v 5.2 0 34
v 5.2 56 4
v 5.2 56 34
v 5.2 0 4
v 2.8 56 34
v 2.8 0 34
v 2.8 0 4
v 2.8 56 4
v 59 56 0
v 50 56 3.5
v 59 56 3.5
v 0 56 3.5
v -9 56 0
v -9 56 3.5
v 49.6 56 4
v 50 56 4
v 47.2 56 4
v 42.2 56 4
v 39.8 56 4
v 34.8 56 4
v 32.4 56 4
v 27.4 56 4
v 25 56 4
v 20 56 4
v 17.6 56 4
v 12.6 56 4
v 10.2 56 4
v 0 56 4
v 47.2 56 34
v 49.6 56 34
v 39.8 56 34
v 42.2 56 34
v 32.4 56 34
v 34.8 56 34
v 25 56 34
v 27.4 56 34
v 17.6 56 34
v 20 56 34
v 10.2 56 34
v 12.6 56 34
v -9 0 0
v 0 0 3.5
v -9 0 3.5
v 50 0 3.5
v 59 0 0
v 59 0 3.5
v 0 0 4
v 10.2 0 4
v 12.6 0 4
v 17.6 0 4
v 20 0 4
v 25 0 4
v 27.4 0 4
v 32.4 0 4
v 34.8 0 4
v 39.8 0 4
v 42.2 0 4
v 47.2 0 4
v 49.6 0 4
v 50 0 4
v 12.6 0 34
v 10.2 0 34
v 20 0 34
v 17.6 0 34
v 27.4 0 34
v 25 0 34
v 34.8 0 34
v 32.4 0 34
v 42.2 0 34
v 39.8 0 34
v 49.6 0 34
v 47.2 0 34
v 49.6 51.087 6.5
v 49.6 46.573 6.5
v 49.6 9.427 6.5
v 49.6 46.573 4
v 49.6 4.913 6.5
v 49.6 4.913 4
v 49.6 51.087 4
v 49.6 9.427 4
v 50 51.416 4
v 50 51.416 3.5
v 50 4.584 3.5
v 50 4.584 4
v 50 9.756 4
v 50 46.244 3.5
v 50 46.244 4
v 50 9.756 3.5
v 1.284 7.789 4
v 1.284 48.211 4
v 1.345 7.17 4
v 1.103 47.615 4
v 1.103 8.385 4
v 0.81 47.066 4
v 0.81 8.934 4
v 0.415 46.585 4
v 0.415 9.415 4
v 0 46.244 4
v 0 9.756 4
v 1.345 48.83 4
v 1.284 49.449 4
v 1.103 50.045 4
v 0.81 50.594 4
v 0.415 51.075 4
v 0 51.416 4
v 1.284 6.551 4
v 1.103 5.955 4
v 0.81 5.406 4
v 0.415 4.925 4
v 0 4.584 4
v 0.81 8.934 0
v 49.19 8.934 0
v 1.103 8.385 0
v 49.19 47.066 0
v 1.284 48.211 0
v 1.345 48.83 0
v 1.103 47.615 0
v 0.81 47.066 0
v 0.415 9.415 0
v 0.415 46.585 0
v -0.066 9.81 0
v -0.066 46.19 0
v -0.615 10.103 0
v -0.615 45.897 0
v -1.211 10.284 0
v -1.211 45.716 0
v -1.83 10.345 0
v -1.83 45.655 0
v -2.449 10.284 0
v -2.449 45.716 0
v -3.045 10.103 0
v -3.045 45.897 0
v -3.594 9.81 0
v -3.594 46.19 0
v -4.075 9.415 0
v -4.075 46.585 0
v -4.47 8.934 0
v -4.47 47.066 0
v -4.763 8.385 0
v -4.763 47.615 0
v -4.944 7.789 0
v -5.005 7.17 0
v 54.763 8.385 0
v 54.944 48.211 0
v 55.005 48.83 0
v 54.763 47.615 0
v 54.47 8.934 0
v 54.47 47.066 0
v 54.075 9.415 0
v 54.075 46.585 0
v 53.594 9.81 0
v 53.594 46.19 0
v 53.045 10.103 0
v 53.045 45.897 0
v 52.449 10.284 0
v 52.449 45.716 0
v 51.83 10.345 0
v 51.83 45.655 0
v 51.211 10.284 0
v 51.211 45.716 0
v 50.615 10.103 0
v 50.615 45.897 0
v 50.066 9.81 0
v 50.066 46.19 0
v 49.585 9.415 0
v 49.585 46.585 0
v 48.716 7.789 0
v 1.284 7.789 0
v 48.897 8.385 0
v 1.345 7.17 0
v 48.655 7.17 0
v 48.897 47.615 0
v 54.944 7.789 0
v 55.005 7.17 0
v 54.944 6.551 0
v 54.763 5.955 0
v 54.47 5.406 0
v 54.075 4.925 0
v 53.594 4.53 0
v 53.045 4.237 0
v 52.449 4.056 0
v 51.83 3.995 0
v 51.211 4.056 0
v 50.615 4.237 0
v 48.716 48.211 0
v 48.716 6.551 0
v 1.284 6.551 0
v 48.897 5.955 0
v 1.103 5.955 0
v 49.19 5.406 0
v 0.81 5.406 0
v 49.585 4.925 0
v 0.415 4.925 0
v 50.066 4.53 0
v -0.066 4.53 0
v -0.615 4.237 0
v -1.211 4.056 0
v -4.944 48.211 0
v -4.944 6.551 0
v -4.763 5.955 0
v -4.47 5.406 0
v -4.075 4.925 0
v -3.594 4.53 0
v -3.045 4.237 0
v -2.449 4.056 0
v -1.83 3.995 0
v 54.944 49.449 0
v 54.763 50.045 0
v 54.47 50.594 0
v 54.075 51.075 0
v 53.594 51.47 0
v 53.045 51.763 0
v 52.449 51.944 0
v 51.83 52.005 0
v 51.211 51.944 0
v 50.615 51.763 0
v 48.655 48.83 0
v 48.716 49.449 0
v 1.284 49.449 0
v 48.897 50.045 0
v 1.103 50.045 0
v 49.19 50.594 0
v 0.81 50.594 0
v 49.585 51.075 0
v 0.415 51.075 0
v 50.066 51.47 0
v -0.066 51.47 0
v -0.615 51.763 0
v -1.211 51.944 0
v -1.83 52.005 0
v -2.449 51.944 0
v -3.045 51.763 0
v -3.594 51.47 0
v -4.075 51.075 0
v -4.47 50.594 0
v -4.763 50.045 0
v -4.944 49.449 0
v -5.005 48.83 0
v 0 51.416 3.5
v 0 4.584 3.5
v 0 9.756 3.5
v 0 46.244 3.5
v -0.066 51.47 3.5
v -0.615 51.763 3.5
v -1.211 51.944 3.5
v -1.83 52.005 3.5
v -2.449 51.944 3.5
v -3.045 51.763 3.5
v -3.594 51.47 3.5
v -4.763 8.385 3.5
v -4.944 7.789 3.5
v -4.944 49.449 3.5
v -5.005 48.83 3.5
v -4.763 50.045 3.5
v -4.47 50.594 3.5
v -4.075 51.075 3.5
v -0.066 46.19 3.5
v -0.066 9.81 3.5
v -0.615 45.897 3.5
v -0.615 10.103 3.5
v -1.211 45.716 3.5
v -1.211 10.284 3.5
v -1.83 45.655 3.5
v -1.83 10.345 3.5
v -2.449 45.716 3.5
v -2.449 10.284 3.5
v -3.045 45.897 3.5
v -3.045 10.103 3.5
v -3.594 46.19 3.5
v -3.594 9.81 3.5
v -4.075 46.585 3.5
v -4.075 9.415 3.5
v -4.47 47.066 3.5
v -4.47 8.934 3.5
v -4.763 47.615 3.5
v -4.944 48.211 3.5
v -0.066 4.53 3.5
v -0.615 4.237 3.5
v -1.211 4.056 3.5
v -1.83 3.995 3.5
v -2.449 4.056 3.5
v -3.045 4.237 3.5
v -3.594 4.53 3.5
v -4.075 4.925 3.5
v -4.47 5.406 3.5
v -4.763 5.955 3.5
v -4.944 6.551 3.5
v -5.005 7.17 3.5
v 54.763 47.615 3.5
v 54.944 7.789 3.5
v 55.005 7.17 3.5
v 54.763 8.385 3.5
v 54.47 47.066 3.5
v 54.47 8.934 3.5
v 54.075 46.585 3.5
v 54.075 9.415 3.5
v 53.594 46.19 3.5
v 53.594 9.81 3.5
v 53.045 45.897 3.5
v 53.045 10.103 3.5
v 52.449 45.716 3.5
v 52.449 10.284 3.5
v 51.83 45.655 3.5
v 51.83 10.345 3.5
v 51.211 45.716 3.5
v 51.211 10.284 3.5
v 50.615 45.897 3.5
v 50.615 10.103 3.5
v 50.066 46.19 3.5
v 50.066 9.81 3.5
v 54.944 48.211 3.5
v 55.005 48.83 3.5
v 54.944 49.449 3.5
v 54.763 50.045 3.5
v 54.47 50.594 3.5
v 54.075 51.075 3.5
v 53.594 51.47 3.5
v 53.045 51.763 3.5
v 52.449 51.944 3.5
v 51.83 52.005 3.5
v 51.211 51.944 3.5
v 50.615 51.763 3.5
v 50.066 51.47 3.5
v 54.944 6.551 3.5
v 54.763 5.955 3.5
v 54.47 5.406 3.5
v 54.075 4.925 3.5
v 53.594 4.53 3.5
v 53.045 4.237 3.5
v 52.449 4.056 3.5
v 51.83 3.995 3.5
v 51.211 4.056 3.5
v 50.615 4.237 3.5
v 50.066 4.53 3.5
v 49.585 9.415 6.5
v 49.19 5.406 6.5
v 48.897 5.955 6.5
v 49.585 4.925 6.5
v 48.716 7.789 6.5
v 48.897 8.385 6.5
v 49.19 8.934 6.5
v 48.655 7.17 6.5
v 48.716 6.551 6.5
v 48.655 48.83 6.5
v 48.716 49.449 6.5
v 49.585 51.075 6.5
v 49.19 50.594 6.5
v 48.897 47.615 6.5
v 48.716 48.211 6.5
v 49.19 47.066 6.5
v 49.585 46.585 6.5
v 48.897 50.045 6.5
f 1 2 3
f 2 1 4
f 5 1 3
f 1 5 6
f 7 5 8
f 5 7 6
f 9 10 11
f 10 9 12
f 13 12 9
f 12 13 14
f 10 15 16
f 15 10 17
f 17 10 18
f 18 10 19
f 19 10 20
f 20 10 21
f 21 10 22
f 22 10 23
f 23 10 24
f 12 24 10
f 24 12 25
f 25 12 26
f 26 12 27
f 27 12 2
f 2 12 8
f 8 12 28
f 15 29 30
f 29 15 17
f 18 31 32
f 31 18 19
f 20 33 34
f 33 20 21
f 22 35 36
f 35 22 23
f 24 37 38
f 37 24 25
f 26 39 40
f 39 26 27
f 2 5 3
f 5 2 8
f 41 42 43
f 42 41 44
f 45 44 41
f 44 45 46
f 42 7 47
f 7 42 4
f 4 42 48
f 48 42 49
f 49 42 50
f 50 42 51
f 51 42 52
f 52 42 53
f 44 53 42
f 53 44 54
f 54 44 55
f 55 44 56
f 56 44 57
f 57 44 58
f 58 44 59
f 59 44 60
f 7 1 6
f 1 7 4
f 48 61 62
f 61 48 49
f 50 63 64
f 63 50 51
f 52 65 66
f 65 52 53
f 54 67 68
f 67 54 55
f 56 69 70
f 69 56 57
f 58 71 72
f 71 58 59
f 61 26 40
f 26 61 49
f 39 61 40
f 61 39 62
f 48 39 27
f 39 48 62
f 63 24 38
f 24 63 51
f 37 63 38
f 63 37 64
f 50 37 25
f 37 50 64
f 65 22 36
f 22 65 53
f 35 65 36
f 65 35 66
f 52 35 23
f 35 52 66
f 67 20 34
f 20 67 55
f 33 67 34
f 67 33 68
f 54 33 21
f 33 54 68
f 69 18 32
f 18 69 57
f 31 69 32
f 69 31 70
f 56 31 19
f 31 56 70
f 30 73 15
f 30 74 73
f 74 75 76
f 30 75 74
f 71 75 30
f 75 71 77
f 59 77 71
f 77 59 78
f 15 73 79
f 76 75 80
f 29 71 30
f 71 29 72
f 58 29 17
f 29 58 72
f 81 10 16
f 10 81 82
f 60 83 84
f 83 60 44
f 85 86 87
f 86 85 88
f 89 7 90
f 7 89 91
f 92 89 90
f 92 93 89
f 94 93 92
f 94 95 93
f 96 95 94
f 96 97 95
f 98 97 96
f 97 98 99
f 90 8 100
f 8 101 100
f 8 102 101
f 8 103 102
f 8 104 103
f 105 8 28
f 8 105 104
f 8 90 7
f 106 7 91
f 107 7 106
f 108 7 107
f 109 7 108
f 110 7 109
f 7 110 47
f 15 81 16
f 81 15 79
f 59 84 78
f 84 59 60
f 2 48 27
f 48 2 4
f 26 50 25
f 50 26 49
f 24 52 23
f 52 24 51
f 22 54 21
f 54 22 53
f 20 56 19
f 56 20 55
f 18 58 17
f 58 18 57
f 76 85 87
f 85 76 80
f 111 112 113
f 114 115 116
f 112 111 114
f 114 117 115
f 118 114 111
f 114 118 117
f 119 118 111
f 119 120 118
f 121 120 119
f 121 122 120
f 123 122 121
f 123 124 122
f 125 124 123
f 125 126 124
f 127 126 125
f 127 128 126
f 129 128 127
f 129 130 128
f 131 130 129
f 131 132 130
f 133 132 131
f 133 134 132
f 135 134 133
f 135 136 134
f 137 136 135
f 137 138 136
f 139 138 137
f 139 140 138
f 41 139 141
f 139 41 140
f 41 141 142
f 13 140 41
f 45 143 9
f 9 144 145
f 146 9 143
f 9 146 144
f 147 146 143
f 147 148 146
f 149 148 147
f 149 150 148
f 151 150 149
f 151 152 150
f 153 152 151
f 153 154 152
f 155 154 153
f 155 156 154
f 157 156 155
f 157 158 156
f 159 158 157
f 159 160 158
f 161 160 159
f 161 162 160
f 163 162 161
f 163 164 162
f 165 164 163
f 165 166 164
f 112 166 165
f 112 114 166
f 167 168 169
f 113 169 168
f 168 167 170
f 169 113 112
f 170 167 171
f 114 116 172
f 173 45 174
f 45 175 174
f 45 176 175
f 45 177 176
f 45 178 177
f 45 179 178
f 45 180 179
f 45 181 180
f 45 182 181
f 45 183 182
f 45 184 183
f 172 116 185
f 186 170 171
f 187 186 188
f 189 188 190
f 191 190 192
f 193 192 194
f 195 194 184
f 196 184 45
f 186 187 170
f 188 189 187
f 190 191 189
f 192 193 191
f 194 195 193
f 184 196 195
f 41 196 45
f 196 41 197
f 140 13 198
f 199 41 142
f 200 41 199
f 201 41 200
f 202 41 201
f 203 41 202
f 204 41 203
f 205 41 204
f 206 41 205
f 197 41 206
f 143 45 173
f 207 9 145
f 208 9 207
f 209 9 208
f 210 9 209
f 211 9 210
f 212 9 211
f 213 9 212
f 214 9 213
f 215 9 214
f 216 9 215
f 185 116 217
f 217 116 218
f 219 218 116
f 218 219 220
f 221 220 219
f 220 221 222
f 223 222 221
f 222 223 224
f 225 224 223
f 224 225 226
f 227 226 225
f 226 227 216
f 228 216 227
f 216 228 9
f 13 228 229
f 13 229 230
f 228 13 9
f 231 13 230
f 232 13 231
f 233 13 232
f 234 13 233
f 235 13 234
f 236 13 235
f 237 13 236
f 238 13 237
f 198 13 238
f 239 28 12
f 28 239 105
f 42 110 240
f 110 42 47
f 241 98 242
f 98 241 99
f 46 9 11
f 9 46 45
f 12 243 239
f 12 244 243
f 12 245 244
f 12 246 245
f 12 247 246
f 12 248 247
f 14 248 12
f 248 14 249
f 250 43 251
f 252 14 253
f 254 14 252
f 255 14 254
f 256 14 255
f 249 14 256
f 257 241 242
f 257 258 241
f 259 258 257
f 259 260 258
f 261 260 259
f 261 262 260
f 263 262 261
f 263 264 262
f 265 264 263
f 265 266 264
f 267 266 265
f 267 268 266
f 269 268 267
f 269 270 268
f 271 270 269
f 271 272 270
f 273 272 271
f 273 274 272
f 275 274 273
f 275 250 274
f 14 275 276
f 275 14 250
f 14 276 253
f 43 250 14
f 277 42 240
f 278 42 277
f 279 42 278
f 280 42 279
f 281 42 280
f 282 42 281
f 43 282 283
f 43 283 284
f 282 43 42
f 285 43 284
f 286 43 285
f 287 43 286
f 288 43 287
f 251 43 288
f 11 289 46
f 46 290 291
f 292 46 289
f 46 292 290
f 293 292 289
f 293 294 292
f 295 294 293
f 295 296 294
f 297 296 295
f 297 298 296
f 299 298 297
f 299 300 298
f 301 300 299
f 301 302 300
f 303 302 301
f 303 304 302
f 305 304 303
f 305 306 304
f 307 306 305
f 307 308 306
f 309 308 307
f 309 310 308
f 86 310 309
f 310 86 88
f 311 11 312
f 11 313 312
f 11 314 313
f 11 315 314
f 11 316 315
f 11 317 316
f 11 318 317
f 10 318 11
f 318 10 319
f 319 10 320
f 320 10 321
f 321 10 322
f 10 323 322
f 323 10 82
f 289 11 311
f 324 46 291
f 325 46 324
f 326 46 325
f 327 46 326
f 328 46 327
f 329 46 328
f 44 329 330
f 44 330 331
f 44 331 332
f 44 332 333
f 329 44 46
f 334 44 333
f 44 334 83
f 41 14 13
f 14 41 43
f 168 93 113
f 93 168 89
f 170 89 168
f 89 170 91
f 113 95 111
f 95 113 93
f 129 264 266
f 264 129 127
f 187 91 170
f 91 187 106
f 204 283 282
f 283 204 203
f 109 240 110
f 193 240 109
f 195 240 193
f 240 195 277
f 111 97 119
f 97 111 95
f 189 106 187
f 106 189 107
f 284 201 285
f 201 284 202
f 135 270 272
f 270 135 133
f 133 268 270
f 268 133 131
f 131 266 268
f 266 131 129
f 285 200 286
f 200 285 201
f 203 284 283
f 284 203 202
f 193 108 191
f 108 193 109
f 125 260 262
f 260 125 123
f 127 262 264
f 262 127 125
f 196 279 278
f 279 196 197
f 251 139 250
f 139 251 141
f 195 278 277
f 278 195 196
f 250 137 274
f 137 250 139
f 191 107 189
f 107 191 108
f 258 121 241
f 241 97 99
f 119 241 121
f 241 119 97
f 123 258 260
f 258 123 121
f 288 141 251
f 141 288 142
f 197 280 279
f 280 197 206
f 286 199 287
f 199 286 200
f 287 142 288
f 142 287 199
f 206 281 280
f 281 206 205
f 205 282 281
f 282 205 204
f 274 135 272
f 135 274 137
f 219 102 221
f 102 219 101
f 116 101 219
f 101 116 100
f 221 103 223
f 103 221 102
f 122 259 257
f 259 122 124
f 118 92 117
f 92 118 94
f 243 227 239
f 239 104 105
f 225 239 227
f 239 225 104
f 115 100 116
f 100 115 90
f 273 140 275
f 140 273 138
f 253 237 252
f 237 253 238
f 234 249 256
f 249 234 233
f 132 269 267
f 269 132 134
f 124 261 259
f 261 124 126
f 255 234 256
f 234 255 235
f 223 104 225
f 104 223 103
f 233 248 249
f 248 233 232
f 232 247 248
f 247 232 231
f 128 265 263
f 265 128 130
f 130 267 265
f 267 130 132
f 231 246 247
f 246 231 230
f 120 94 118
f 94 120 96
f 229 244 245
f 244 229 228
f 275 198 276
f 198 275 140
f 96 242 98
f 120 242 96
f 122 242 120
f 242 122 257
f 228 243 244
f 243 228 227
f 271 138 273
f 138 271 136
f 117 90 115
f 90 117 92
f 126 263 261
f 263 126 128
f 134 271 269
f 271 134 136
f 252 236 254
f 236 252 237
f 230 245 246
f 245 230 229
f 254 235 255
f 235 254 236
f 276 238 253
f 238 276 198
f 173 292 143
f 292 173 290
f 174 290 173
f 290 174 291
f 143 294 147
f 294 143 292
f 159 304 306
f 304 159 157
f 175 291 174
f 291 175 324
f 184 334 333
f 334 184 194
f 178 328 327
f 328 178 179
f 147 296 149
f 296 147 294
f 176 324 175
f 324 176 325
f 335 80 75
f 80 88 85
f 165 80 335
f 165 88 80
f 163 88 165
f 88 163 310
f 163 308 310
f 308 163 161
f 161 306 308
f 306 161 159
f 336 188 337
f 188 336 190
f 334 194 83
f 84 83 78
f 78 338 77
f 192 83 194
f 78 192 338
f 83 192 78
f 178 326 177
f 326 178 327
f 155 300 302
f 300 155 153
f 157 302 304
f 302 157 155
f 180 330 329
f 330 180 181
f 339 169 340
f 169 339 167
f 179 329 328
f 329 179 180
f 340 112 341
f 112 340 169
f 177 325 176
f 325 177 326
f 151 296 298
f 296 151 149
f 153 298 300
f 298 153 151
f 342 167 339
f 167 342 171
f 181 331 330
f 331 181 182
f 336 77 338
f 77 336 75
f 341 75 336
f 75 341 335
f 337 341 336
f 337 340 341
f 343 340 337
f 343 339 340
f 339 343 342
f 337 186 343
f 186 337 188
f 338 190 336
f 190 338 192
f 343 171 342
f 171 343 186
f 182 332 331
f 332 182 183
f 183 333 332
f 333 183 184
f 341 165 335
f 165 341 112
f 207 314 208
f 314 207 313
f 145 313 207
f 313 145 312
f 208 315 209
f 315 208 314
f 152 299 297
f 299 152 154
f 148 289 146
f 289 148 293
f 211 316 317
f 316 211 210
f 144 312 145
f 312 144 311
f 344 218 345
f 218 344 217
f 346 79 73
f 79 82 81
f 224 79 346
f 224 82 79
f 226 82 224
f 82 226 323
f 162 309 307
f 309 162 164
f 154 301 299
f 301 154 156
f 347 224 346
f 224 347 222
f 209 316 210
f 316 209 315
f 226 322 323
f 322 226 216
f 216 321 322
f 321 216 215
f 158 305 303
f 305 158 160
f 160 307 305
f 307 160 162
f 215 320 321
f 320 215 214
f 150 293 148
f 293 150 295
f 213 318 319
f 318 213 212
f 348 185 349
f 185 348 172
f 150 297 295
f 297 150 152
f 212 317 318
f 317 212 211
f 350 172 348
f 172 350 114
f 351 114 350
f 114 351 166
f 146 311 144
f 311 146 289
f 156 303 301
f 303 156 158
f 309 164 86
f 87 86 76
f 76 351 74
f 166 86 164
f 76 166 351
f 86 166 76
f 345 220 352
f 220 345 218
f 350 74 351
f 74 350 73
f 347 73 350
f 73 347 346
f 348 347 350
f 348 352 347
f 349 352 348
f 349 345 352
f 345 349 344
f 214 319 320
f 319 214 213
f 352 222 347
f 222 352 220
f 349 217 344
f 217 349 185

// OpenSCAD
$fn = 32;

// ----------------------------------------------------------------------
// Finned heat sink: 50 x 56 mm base, 30 mm fins
// ----------------------------------------------------------------------

// --- parameters (mm) ---
base_w = 50;              // base width
base_d = 56;              // base depth
base_t = 4;               // base thickness
fin_h = 30;               // fin height above the base
holes_d = 6.35;           // fixing holes
hole_x = 26.83;           // hole offset in x
hole_y = 20.83;           // hole offset in y
fin_t = 2.4;              // fin thickness
fin_pitch = 7.4;          // fin pitch
fin_count = 7;            // number of fins
fin_x0 = 2.8;             // first fin offset
flange_w = 68;            // flange plate width
flange_t = 3;             // flange plate thickness

difference() {
  union() {
    cube([base_w, base_d, base_t]);
    for (i = [0 : fin_count - 1]) {
      translate([fin_x0 + i * fin_pitch, 0, base_t - 0.5]) cube([fin_t, base_d, fin_h + 0.5]);
    }
    /* mounting flange, a wider plate sharing the base bottom */
    translate([(base_w - flange_w) / 2, 0, 0]) cube([flange_w, base_d, flange_t + 0.5]);
  }
  /* fixing holes through the base, 2.5 mm clear on both sides */
  for (hx = [-26.83, 26.83]) {
    for (hy = [-20.83, 20.83]) {
      translate([base_w / 2 + hx, base_d / 2 + hy, -2.5]) cylinder(h = base_t + 5, d = holes_d);
    }
  }
}
